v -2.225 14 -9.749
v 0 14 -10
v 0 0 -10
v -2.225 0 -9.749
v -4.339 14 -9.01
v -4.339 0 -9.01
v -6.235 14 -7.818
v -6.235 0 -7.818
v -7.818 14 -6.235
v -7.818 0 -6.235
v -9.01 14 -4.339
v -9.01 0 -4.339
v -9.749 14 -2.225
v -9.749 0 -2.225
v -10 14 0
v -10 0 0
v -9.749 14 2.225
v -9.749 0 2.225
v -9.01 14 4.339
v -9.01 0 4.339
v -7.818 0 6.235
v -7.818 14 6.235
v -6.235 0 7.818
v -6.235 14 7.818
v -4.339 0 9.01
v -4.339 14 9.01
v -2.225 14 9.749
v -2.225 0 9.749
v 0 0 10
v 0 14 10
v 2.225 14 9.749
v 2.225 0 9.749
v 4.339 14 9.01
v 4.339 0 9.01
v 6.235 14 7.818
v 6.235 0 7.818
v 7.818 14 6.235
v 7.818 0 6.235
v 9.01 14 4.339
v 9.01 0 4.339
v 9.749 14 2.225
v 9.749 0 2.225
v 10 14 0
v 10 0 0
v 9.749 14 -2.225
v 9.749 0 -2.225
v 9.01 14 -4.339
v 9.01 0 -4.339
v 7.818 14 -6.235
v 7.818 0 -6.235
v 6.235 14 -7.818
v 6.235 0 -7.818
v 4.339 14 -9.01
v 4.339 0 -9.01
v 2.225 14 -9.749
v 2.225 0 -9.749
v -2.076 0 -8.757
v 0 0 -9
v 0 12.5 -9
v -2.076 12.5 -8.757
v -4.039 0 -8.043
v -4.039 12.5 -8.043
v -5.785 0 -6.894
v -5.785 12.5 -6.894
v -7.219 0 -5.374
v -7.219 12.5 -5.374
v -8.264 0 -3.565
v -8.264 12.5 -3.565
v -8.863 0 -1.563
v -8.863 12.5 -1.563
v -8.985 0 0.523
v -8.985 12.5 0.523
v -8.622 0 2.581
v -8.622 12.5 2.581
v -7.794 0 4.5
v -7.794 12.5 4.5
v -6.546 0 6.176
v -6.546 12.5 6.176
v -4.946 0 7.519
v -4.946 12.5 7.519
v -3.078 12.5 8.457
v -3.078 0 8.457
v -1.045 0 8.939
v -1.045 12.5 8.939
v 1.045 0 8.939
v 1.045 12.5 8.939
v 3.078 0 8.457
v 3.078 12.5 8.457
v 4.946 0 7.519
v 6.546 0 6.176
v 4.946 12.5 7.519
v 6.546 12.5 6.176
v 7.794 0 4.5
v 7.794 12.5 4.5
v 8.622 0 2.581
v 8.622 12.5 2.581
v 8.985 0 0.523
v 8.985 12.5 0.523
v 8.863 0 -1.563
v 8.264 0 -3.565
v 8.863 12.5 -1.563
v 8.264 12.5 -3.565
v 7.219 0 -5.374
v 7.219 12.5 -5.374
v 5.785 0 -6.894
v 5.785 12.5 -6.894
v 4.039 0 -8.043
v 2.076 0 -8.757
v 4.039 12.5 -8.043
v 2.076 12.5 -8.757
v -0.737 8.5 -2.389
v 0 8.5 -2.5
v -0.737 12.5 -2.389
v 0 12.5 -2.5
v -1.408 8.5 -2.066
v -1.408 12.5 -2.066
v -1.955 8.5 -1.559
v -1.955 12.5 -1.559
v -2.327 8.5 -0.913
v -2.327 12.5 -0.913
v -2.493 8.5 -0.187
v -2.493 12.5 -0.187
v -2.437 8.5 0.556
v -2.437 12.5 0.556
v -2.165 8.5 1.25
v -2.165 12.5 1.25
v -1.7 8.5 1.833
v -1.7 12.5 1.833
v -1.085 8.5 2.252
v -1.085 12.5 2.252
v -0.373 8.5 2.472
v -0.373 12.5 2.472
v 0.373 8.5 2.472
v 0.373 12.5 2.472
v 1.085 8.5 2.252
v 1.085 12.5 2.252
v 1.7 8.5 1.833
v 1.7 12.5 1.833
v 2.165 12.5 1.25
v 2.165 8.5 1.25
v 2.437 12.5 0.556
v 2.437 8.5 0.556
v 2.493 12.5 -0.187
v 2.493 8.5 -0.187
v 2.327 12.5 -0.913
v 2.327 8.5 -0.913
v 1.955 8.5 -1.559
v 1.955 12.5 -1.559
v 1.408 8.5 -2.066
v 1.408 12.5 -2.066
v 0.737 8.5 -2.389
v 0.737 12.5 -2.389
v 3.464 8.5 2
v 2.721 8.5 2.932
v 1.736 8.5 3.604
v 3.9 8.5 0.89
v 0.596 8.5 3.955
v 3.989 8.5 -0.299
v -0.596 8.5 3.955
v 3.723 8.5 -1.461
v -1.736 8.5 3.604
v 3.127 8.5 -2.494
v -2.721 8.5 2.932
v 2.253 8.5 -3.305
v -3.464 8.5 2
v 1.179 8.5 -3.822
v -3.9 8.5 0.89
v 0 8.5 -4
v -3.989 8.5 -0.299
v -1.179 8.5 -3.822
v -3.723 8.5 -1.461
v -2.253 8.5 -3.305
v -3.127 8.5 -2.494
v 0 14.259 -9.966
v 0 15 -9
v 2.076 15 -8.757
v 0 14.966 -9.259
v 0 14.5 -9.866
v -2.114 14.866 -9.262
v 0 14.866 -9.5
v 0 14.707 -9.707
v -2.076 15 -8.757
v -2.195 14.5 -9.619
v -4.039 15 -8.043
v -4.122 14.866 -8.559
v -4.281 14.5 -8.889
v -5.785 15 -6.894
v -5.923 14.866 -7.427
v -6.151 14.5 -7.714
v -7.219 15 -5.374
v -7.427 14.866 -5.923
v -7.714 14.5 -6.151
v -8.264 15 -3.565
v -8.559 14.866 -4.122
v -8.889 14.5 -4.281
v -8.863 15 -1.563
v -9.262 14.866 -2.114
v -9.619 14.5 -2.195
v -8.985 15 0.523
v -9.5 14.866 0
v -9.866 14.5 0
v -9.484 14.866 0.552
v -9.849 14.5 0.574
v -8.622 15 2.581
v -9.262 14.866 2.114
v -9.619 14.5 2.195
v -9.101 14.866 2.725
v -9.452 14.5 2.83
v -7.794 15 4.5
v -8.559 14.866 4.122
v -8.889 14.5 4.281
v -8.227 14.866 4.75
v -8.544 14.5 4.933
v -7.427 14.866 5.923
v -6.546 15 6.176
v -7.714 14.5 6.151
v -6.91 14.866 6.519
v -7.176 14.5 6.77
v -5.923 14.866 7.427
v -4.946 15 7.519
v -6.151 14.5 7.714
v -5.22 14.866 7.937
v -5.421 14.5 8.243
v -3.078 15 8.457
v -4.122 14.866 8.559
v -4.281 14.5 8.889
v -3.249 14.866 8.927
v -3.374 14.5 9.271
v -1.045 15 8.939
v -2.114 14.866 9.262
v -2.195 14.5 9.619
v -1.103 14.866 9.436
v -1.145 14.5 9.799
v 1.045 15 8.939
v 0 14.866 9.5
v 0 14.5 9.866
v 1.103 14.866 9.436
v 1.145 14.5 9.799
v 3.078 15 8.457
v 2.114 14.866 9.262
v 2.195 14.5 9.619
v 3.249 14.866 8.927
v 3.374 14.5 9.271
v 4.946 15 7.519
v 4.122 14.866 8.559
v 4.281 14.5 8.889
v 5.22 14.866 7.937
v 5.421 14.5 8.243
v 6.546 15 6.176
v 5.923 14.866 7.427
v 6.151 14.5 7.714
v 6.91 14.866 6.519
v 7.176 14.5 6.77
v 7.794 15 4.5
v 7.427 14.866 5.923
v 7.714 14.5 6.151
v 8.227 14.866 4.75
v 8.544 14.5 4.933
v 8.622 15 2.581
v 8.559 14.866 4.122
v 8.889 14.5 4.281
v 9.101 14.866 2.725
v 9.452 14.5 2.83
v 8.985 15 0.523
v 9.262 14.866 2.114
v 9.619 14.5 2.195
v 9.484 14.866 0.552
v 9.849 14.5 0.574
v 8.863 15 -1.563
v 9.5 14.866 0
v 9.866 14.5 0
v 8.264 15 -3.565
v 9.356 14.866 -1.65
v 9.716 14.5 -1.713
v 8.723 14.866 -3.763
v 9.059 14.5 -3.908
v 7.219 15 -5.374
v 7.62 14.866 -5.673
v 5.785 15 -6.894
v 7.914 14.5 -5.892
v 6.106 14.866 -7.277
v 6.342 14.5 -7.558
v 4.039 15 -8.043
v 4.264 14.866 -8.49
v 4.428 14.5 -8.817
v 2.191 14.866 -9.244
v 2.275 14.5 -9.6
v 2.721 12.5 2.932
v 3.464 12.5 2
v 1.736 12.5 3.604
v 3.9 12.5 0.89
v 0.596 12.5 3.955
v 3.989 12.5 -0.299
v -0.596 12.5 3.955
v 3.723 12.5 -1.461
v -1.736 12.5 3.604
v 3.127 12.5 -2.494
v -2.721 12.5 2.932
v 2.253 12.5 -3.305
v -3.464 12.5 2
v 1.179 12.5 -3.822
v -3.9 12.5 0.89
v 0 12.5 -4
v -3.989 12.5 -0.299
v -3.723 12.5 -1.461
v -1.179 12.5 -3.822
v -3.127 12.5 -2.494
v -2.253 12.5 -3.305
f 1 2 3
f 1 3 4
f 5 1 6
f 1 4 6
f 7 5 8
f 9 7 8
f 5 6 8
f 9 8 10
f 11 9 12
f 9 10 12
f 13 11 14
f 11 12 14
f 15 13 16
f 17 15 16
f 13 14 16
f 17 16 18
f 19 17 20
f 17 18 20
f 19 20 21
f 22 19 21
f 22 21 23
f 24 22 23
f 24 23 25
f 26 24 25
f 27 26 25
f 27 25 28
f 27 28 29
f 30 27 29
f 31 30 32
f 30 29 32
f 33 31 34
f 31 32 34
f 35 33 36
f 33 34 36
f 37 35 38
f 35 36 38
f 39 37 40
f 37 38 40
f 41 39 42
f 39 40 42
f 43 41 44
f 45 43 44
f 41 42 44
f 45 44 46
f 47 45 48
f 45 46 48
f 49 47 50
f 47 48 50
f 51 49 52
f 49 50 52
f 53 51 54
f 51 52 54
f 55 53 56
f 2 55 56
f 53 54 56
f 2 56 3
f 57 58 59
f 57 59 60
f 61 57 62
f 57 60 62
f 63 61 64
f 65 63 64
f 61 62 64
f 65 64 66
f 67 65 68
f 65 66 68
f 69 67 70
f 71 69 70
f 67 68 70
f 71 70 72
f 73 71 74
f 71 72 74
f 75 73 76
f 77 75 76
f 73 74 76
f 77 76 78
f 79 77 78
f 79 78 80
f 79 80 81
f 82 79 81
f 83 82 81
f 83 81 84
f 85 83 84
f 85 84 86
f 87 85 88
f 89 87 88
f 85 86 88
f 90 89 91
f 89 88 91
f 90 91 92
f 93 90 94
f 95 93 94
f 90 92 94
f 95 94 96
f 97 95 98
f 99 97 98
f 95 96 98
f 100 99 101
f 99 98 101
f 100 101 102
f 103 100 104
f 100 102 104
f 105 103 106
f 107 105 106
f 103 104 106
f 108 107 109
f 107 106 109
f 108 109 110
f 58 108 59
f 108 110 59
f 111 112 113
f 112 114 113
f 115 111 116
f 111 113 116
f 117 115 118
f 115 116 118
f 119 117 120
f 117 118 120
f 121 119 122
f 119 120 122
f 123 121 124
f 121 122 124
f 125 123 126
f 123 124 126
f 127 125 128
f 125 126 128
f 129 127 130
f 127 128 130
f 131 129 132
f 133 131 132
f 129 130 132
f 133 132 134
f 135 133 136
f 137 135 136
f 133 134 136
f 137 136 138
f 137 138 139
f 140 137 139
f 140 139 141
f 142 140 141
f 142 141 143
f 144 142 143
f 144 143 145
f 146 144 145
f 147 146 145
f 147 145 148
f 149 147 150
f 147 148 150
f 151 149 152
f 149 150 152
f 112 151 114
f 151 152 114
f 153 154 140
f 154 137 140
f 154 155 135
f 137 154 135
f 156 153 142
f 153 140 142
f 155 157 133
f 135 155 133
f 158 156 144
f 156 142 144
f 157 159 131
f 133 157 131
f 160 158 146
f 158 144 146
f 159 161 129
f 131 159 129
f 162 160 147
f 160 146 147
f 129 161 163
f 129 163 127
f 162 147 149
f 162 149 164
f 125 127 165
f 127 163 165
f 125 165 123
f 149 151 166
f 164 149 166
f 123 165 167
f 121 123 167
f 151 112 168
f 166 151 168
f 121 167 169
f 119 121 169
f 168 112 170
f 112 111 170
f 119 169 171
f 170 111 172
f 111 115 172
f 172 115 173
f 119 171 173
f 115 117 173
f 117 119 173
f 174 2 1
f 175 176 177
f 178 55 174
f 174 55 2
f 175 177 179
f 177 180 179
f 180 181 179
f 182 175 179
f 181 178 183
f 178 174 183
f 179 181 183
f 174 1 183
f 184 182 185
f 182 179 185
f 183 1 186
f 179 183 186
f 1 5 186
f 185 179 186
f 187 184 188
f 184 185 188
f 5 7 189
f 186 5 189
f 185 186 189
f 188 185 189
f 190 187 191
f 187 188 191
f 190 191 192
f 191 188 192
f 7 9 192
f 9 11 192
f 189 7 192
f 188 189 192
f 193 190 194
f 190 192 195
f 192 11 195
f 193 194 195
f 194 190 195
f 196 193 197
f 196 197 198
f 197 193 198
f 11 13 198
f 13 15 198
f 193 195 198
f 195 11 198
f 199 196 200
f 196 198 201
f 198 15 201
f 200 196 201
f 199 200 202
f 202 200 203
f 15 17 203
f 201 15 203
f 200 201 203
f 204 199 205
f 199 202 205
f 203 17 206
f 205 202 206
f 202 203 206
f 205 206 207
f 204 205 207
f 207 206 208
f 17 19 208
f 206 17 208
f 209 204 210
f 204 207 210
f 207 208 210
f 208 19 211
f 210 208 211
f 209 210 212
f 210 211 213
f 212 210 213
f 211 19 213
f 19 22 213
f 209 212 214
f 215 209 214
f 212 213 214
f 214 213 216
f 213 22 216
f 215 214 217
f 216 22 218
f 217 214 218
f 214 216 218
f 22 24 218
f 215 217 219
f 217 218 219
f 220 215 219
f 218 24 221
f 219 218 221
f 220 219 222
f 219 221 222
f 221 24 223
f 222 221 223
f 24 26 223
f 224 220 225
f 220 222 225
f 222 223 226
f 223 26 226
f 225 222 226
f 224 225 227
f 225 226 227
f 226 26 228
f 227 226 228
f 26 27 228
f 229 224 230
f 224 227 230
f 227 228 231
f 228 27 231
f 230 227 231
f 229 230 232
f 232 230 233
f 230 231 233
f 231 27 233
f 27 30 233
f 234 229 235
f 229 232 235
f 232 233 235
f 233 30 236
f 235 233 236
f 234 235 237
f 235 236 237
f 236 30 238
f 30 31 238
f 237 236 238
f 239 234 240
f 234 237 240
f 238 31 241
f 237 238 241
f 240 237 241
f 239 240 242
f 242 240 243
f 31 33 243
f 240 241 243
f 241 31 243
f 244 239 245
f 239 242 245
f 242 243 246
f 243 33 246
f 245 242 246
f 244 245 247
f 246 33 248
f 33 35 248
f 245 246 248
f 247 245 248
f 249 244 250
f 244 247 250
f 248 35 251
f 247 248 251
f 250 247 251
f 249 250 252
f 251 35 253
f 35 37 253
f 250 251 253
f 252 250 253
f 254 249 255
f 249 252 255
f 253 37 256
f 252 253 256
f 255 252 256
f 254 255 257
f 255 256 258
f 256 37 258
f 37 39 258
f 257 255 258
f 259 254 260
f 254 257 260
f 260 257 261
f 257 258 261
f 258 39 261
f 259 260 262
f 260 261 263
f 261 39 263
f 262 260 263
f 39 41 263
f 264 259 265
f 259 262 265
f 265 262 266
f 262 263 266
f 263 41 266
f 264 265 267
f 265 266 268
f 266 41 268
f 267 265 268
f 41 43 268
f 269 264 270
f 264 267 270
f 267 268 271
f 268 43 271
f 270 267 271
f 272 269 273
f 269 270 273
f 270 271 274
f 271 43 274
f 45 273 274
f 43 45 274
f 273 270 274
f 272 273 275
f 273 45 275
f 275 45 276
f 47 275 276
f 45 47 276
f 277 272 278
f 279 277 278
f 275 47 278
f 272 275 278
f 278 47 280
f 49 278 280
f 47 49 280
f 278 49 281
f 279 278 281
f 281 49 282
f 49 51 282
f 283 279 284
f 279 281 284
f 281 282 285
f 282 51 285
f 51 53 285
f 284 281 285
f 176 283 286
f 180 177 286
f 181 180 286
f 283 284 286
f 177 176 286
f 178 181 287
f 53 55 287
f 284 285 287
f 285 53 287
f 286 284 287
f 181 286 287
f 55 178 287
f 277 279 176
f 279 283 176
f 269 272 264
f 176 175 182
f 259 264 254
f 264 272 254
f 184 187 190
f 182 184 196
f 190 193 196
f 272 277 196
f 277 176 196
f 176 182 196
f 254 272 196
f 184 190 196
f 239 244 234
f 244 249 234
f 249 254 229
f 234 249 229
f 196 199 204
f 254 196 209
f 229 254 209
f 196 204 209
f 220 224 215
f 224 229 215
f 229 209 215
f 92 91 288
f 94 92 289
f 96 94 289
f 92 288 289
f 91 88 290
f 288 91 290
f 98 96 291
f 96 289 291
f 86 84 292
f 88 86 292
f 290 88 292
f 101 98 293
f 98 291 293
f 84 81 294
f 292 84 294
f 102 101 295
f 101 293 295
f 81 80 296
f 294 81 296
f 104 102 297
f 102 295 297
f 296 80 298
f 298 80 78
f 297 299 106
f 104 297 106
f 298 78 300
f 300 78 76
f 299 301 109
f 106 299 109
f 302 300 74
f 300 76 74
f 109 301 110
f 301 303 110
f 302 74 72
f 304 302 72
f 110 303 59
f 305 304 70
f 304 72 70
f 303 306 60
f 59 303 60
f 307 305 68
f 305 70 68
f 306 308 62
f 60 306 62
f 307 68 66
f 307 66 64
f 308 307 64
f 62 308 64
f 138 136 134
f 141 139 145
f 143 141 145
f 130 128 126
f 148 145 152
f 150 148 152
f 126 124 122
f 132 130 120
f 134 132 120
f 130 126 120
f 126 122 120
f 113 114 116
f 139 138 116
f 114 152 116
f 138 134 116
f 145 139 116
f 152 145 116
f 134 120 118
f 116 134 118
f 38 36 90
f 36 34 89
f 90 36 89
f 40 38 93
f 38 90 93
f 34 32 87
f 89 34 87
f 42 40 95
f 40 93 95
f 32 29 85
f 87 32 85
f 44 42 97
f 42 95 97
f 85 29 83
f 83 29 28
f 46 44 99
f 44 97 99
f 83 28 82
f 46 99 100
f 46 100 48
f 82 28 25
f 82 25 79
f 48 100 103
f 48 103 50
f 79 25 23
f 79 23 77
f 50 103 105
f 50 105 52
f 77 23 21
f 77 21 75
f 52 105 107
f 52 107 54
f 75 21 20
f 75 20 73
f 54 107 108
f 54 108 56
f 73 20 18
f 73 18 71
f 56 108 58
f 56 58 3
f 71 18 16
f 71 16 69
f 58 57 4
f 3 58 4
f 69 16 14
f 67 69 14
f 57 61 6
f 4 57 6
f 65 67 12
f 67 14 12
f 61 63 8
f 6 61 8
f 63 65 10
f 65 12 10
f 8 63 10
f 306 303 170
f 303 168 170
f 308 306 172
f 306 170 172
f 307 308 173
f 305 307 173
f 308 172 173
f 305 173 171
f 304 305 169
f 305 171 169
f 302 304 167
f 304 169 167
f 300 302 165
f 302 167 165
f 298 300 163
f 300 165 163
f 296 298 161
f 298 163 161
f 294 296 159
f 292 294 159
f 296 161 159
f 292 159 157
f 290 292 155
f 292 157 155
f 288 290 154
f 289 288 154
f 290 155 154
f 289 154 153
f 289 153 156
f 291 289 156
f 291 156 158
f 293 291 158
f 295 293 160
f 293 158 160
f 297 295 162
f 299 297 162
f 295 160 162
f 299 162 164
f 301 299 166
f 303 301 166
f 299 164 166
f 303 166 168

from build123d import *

# Parameters (mm, degrees)
FILLET1_R = 1


with BuildPart() as part:
    # Sketch1 → Revolve1 (revolve)
    with BuildSketch(Plane(origin=(0, 0, 0), x_dir=(0, 0, -1), z_dir=(1, 0, 0))):
        Polygon((9, 0), (9, 12.5), (4, 12.5), (4, 8.5), (2.5, 8.5), (2.5, 12.5), (0, 12.5), (0, 15), (10, 15), (10, 0), align=None)
    revolve(axis=Axis((0, 0, 0), (0, 1, 0)))

    # Fillet1
    fillet1_edges = [part.edges().sort_by_distance(p)[0] for p in [
        (0, 15, 10),
    ]]
    fillet(fillet1_edges, radius=FILLET1_R)


solid = part.part
